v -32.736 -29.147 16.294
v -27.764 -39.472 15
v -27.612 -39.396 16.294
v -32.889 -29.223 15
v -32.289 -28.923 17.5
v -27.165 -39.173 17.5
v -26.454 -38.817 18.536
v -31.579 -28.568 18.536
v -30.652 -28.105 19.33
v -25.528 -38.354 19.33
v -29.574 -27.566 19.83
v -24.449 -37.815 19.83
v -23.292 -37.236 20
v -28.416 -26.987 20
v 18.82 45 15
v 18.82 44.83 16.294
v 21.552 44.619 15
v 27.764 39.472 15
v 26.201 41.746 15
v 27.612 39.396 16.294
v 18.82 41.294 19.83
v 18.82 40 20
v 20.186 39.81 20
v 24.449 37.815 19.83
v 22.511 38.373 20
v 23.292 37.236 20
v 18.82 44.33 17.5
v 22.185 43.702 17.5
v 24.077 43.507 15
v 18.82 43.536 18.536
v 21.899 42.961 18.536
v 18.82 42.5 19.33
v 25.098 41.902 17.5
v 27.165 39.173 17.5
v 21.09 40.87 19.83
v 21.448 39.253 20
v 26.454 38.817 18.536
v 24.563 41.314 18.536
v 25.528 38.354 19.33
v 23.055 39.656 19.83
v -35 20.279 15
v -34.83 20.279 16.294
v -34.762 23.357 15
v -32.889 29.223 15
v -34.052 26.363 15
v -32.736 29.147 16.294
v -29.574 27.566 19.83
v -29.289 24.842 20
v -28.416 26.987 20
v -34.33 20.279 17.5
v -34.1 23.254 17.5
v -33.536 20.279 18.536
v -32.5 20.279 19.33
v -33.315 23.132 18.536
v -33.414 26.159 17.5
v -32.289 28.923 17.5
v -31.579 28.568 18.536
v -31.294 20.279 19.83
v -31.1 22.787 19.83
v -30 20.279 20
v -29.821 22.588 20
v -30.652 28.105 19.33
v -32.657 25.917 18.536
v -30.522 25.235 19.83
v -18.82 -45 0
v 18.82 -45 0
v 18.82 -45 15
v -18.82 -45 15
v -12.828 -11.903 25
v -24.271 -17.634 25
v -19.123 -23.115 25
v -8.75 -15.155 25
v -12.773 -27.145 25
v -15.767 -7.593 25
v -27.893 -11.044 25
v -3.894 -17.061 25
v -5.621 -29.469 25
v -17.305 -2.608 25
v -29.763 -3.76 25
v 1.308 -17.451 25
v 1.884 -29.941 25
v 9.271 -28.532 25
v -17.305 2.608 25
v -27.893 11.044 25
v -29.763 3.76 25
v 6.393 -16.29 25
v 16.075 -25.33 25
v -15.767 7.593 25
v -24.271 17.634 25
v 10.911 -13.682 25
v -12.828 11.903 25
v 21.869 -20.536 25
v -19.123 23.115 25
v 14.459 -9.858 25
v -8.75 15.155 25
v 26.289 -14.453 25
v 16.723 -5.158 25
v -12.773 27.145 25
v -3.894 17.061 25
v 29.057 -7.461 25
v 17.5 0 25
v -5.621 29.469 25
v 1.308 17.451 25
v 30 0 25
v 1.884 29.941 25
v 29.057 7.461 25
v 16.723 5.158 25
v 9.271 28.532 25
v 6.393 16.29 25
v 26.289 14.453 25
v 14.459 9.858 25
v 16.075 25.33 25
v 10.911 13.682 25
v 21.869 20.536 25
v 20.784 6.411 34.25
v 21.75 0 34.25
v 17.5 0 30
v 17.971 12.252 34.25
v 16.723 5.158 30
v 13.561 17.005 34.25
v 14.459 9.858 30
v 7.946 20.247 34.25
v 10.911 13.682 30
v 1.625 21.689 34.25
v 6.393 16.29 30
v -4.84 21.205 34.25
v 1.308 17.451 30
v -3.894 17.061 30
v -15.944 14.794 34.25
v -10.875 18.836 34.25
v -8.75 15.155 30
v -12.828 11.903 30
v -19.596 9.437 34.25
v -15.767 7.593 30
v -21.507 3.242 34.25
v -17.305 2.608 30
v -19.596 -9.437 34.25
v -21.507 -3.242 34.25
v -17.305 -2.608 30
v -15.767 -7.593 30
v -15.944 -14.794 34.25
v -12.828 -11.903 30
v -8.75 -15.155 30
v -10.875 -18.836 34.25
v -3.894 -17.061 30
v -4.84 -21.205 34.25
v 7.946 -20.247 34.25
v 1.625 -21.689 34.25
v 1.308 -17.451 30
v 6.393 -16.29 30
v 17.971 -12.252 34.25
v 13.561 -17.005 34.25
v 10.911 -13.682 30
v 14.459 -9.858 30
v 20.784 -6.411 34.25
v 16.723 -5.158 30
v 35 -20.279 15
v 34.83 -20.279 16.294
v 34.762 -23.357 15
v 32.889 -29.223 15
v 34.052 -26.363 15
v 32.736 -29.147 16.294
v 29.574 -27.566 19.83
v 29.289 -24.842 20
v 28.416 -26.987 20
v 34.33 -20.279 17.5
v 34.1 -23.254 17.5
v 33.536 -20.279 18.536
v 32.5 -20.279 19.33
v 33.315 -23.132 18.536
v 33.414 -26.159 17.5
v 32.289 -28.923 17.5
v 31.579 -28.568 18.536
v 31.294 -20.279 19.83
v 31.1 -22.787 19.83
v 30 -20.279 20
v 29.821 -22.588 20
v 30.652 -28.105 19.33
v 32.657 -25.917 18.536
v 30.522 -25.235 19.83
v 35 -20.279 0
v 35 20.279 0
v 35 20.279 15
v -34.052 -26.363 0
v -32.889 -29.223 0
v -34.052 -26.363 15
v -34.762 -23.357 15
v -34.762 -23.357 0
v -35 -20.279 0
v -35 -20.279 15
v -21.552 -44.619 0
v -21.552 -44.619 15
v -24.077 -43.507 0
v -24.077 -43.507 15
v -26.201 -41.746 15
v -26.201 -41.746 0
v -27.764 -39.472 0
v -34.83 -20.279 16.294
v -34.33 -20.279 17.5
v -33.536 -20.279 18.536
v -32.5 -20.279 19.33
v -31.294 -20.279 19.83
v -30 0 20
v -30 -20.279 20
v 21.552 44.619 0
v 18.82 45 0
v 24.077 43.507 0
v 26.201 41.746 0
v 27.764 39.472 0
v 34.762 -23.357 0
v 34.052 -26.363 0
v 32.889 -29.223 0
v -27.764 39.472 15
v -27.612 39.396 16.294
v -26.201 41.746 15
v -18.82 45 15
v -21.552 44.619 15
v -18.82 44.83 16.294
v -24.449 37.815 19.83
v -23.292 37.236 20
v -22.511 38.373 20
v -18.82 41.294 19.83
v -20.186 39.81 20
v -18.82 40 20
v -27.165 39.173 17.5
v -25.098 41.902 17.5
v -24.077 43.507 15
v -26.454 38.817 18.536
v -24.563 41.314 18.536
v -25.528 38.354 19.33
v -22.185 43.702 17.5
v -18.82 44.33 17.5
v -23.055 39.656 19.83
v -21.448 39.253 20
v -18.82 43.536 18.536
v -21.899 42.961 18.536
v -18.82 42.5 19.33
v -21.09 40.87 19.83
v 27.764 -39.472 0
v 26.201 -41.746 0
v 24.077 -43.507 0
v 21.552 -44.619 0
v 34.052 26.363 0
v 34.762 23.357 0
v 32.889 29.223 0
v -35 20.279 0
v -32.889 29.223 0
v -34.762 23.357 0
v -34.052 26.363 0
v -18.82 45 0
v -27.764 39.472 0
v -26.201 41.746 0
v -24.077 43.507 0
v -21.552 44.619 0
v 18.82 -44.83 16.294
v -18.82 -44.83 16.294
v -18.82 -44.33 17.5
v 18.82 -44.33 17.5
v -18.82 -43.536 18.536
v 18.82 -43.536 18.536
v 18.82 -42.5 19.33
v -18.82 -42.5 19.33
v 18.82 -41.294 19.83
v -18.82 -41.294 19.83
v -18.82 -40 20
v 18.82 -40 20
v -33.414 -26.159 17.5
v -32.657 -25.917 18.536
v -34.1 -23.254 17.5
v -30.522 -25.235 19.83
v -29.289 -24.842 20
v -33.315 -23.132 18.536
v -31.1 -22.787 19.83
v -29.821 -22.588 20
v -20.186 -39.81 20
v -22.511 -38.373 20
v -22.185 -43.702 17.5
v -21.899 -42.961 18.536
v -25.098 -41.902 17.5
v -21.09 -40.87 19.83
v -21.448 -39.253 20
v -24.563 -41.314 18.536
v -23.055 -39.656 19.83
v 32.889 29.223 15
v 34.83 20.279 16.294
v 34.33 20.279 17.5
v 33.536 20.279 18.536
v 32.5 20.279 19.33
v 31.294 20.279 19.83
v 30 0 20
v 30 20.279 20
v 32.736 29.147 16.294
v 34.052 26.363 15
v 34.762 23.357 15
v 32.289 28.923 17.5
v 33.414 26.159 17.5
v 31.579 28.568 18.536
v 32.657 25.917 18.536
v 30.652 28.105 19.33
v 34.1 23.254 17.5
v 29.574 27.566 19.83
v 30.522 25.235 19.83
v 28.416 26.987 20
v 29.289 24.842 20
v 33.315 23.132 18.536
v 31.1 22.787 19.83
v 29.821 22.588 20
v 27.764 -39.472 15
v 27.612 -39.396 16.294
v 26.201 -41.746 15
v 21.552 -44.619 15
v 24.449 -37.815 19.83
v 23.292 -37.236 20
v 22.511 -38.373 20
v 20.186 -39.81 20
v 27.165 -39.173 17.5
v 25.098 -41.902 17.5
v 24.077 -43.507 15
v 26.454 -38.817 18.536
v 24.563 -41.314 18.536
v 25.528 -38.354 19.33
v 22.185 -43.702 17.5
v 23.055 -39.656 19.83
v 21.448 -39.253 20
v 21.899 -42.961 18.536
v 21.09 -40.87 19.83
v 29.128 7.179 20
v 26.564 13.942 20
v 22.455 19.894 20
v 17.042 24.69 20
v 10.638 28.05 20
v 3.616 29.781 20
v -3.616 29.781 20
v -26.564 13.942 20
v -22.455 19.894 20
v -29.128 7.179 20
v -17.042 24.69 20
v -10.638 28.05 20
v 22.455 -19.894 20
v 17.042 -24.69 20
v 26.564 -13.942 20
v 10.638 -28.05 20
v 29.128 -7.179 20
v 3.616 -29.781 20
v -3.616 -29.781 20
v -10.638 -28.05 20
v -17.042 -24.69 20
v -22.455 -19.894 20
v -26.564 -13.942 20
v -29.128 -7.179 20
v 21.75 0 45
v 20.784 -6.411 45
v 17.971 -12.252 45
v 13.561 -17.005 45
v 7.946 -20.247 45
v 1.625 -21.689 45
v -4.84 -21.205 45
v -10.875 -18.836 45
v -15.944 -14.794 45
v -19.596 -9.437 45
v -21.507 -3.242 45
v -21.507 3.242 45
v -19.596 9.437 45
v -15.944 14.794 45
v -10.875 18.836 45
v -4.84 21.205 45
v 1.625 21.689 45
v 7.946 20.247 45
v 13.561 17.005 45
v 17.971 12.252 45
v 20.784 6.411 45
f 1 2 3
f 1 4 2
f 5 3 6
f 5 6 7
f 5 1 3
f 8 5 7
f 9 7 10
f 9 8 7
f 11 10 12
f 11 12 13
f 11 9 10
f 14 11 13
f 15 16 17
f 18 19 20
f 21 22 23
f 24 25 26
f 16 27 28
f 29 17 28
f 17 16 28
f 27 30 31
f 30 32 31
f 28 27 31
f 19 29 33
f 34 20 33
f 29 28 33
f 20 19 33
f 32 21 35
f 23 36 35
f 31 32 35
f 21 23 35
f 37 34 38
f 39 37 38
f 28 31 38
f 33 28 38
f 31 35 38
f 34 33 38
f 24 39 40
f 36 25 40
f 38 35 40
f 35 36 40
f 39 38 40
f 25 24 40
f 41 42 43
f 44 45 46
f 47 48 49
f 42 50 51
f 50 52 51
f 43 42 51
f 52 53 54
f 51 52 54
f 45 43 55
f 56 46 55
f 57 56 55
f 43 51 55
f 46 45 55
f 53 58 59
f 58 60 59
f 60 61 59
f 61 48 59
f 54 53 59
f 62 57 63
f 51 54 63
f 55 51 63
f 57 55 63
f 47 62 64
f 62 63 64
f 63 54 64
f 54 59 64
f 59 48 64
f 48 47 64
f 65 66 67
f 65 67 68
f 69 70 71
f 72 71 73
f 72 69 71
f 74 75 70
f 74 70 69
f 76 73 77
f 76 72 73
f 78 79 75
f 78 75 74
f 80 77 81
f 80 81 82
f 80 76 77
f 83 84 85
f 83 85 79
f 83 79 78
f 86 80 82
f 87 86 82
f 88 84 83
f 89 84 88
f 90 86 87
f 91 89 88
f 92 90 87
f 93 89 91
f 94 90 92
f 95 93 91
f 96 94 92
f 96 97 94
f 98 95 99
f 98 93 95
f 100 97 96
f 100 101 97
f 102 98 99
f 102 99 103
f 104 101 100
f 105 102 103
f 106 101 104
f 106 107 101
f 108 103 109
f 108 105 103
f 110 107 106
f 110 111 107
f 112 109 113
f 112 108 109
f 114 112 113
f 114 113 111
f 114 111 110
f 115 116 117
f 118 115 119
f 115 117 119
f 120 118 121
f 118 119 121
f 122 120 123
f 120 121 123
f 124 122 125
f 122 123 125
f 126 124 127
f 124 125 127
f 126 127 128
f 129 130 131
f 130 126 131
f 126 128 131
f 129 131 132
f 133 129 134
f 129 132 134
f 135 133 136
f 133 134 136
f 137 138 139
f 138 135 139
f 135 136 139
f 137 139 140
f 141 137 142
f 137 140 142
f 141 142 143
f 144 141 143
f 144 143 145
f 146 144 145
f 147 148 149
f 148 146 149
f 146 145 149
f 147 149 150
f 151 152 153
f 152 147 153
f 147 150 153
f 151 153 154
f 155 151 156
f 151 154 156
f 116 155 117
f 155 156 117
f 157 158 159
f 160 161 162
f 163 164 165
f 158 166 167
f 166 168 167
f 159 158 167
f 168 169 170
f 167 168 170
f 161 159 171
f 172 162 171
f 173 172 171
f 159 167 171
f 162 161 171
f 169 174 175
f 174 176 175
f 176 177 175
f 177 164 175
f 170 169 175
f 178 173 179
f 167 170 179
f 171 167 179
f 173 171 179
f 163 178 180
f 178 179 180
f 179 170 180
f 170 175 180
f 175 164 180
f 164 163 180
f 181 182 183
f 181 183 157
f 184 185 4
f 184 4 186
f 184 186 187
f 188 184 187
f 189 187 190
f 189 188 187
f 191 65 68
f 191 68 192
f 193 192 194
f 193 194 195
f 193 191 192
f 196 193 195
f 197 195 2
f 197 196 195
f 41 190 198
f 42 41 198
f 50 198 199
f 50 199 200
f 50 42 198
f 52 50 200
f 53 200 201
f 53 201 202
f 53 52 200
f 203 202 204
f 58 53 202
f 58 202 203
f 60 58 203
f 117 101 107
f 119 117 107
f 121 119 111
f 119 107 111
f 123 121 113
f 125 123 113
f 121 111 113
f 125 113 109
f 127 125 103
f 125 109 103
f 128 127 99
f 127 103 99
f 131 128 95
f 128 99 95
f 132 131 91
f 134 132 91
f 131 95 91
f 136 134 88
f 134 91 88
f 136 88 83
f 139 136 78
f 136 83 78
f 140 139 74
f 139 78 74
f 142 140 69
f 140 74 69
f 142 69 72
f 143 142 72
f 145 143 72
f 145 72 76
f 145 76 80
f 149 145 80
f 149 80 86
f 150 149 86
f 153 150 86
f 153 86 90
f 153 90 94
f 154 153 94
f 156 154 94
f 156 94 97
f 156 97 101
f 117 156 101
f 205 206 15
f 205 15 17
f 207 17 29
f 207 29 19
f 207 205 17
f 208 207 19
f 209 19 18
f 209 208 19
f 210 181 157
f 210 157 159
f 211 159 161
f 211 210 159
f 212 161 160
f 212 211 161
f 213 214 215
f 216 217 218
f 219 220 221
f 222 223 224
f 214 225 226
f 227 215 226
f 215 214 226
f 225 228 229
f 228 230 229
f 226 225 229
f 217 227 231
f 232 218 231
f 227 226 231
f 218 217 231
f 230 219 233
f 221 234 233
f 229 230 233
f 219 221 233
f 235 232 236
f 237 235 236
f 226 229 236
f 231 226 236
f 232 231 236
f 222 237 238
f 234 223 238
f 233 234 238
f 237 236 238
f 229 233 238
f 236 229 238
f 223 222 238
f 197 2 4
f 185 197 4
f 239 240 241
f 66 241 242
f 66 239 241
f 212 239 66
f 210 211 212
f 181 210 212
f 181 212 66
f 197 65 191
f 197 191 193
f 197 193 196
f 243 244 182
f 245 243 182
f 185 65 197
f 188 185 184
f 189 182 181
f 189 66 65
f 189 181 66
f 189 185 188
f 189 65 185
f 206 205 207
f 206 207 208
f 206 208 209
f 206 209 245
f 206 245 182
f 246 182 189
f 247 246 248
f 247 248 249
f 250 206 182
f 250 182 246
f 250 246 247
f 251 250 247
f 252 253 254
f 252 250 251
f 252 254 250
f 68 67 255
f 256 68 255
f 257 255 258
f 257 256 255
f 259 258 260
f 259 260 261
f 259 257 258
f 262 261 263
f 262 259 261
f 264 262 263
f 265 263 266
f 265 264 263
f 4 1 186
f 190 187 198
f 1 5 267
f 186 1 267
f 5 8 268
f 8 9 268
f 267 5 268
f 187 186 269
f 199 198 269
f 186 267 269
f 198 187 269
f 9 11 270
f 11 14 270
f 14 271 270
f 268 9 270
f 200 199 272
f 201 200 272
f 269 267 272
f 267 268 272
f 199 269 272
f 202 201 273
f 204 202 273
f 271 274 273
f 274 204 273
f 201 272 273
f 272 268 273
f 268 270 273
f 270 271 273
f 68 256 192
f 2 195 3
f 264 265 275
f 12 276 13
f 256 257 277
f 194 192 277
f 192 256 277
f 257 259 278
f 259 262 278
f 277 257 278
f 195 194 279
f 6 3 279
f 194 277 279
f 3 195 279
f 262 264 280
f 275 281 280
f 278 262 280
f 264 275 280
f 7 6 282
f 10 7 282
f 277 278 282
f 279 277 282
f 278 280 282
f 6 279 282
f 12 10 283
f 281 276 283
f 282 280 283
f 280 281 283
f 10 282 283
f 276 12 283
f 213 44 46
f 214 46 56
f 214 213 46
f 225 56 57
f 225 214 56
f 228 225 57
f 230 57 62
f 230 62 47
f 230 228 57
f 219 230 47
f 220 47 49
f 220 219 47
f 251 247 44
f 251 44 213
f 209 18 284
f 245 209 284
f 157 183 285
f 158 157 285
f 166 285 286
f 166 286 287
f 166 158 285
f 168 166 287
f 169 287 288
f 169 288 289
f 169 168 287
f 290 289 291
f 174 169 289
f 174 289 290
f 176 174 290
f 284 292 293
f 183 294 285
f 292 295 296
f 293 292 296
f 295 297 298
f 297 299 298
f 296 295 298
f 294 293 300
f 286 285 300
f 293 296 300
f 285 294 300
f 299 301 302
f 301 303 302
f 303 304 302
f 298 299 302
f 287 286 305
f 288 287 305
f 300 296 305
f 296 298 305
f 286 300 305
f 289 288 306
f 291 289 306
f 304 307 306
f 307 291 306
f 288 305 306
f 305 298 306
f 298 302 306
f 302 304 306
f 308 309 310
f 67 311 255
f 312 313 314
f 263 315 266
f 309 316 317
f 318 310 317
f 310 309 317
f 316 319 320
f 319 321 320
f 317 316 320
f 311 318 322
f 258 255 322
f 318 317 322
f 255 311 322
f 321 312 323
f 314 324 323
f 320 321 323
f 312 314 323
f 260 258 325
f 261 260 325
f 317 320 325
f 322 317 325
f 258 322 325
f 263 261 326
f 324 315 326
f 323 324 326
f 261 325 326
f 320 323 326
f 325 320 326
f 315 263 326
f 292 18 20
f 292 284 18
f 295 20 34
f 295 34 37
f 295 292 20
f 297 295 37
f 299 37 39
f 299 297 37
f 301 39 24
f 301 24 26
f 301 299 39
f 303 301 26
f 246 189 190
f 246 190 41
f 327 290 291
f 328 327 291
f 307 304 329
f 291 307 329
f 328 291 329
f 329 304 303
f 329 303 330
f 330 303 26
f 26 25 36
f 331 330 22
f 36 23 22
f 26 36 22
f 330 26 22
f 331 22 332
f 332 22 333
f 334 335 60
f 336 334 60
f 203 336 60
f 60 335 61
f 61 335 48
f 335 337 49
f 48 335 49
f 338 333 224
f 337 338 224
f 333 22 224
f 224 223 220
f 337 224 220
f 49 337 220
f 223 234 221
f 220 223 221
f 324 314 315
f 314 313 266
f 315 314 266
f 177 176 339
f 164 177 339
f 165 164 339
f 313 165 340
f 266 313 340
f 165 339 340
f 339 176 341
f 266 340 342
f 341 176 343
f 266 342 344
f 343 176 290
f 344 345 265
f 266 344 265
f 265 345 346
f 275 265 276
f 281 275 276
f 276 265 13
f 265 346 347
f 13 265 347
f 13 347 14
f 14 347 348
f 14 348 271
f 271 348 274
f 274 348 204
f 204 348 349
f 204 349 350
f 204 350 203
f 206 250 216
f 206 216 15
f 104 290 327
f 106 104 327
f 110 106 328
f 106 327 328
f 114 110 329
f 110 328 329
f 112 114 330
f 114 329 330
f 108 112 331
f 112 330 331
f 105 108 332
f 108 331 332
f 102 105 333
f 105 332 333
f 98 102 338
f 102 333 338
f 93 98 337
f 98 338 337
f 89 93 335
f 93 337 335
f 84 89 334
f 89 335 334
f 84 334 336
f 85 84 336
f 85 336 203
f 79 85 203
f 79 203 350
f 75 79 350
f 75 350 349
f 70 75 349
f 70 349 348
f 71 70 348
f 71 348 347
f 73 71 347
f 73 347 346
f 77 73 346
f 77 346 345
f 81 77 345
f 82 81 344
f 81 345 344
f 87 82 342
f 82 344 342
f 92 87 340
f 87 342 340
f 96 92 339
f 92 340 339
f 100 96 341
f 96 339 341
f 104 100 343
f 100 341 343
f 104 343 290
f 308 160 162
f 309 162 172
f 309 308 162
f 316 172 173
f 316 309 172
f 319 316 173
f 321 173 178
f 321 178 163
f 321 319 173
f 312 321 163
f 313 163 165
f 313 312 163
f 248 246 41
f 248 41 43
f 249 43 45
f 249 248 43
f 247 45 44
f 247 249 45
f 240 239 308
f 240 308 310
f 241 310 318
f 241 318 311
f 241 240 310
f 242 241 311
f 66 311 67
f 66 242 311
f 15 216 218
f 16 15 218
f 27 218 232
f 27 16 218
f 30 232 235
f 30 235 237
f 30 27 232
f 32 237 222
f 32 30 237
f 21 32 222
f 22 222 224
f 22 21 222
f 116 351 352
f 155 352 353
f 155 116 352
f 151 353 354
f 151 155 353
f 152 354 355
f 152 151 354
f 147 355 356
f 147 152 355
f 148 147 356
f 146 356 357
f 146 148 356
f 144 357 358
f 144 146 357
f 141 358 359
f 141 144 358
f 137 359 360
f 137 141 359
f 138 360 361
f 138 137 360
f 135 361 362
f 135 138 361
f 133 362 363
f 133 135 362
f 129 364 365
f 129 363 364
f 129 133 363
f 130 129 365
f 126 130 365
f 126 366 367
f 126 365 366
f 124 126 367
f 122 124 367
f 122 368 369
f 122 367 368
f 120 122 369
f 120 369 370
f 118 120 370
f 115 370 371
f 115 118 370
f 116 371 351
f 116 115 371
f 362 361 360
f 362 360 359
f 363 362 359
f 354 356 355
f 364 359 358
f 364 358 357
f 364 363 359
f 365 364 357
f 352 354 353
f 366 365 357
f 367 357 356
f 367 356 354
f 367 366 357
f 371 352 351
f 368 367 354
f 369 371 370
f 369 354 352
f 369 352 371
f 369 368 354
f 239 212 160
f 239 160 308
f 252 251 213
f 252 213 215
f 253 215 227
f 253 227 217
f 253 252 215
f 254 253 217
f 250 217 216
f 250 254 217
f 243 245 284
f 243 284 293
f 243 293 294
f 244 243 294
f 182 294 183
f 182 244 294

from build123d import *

# Parameters (mm, degrees)
BOSS_EXTRUDE1_DEPTH = 20
FILLET1_R           = 5
SKETCH2_R           = 30
BOSS_EXTRUDE2_DEPTH = 5
SKETCH3_R           = 17.5
BOSS_EXTRUDE3_DEPTH = 10
SKETCH4_R           = 21.75
BOSS_EXTRUDE4_DEPTH = 10
CHAMFER1_SIZE       = 5


with BuildPart() as part:
    # Sketch1 → Boss-Extrude1 (new body)
    with BuildSketch(Plane.XY):
        with BuildLine():
            Line((-32.88854382, 29.22291236), (-27.763932023, 39.472135955))
            ThreePointArc((-27.763932023, 39.472135955), (-24.076971234, 43.506508084), (-18.819660113, 45))
            Line((-18.819660113, 45), (18.819660113, 45))
            ThreePointArc((18.819660113, 45), (24.076971234, 43.506508084), (27.763932023, 39.472135955))
            Line((27.763932023, 39.472135955), (32.88854382, 29.22291236))
            ThreePointArc((32.88854382, 29.22291236), (34.464979789, 24.873698861), (35, 20.27864045))
            Line((35, 20.27864045), (35, -20.27864045))
            ThreePointArc((35, -20.27864045), (34.464979789, -24.873698861), (32.88854382, -29.22291236))
            Line((32.88854382, -29.22291236), (27.763932023, -39.472135955))
            ThreePointArc((27.763932023, -39.472135955), (24.076971234, -43.506508084), (18.819660113, -45))
            Line((18.819660113, -45), (-18.819660113, -45))
            ThreePointArc((-18.819660113, -45), (-24.076971234, -43.506508084), (-27.763932023, -39.472135955))
            Line((-27.763932023, -39.472135955), (-32.88854382, -29.22291236))
            ThreePointArc((-32.88854382, -29.22291236), (-34.464979789, -24.873698861), (-35, -20.27864045))
            Line((-35, -20.27864045), (-35, 20.27864045))
            ThreePointArc((-35, 20.27864045), (-34.464979789, 24.873698861), (-32.88854382, 29.22291236))
        make_face()
    extrude(amount=BOSS_EXTRUDE1_DEPTH)

    # Fillet1
    fillet1_edges = [part.edges().sort_by_distance(p)[0] for p in [
        (24.076971234, -43.506508084, 20),
        (30.326237921, -34.347524158, 20),
        (34.464979789, -24.873698861, 20),
        (35, 0, 20),
        (34.464979789, 24.873698861, 20),
        (30.326237921, 34.347524158, 20),
        (24.076971234, 43.506508084, 20),
        (0, 45, 20),
        (-24.076971234, 43.506508084, 20),
        (-30.326237921, 34.347524158, 20),
        (-24.076971234, -43.506508084, 20),
        (-34.464979789, 24.873698861, 20),
        (-35, 0, 20),
        (-34.464979789, -24.873698861, 20),
        (-30.326237921, -34.347524158, 20),
        (0, -45, 20),
    ]]
    fillet(fillet1_edges, radius=FILLET1_R)

    # Sketch2 → Boss-Extrude2 (add)
    with BuildSketch(Plane.XY.offset(20)):
        Circle(SKETCH2_R)
    extrude(amount=BOSS_EXTRUDE2_DEPTH)

    # Sketch3 → Boss-Extrude3 (add)
    with BuildSketch(Plane.XY.offset(25)):
        Circle(SKETCH3_R)
    extrude(amount=BOSS_EXTRUDE3_DEPTH)

    # Sketch4 → Boss-Extrude4 (add)
    with BuildSketch(Plane.XY.offset(35)):
        Circle(SKETCH4_R)
    extrude(amount=BOSS_EXTRUDE4_DEPTH)

    # Chamfer1
    # the kernel refuses this chamfer: 5 mm, written as the material it adds along each edge
    with BuildSketch(Plane(origin=(0, 0, 35), x_dir=(1, 0, 0), z_dir=(0, -1, 0))) as chamfer1_piece_1_section:
        Polygon((17.5 + CHAMFER1_SIZE, 0), (17.5, -CHAMFER1_SIZE), (17.5, 0), align=None)
    chamfer1_piece_1 = revolve(axis=Axis((0, 0, 35), (0, 0, 1)), mode=Mode.PRIVATE)
    chamfer1_piece_1 = chamfer1_piece_1 & Plane(origin=(0, 0, 32.136850645), x_dir=(1, 0, 0), z_dir=(0, 0, -1)) * Cylinder(21.75, 91, mode=Mode.PRIVATE)
    add(chamfer1_piece_1)


solid = part.part
